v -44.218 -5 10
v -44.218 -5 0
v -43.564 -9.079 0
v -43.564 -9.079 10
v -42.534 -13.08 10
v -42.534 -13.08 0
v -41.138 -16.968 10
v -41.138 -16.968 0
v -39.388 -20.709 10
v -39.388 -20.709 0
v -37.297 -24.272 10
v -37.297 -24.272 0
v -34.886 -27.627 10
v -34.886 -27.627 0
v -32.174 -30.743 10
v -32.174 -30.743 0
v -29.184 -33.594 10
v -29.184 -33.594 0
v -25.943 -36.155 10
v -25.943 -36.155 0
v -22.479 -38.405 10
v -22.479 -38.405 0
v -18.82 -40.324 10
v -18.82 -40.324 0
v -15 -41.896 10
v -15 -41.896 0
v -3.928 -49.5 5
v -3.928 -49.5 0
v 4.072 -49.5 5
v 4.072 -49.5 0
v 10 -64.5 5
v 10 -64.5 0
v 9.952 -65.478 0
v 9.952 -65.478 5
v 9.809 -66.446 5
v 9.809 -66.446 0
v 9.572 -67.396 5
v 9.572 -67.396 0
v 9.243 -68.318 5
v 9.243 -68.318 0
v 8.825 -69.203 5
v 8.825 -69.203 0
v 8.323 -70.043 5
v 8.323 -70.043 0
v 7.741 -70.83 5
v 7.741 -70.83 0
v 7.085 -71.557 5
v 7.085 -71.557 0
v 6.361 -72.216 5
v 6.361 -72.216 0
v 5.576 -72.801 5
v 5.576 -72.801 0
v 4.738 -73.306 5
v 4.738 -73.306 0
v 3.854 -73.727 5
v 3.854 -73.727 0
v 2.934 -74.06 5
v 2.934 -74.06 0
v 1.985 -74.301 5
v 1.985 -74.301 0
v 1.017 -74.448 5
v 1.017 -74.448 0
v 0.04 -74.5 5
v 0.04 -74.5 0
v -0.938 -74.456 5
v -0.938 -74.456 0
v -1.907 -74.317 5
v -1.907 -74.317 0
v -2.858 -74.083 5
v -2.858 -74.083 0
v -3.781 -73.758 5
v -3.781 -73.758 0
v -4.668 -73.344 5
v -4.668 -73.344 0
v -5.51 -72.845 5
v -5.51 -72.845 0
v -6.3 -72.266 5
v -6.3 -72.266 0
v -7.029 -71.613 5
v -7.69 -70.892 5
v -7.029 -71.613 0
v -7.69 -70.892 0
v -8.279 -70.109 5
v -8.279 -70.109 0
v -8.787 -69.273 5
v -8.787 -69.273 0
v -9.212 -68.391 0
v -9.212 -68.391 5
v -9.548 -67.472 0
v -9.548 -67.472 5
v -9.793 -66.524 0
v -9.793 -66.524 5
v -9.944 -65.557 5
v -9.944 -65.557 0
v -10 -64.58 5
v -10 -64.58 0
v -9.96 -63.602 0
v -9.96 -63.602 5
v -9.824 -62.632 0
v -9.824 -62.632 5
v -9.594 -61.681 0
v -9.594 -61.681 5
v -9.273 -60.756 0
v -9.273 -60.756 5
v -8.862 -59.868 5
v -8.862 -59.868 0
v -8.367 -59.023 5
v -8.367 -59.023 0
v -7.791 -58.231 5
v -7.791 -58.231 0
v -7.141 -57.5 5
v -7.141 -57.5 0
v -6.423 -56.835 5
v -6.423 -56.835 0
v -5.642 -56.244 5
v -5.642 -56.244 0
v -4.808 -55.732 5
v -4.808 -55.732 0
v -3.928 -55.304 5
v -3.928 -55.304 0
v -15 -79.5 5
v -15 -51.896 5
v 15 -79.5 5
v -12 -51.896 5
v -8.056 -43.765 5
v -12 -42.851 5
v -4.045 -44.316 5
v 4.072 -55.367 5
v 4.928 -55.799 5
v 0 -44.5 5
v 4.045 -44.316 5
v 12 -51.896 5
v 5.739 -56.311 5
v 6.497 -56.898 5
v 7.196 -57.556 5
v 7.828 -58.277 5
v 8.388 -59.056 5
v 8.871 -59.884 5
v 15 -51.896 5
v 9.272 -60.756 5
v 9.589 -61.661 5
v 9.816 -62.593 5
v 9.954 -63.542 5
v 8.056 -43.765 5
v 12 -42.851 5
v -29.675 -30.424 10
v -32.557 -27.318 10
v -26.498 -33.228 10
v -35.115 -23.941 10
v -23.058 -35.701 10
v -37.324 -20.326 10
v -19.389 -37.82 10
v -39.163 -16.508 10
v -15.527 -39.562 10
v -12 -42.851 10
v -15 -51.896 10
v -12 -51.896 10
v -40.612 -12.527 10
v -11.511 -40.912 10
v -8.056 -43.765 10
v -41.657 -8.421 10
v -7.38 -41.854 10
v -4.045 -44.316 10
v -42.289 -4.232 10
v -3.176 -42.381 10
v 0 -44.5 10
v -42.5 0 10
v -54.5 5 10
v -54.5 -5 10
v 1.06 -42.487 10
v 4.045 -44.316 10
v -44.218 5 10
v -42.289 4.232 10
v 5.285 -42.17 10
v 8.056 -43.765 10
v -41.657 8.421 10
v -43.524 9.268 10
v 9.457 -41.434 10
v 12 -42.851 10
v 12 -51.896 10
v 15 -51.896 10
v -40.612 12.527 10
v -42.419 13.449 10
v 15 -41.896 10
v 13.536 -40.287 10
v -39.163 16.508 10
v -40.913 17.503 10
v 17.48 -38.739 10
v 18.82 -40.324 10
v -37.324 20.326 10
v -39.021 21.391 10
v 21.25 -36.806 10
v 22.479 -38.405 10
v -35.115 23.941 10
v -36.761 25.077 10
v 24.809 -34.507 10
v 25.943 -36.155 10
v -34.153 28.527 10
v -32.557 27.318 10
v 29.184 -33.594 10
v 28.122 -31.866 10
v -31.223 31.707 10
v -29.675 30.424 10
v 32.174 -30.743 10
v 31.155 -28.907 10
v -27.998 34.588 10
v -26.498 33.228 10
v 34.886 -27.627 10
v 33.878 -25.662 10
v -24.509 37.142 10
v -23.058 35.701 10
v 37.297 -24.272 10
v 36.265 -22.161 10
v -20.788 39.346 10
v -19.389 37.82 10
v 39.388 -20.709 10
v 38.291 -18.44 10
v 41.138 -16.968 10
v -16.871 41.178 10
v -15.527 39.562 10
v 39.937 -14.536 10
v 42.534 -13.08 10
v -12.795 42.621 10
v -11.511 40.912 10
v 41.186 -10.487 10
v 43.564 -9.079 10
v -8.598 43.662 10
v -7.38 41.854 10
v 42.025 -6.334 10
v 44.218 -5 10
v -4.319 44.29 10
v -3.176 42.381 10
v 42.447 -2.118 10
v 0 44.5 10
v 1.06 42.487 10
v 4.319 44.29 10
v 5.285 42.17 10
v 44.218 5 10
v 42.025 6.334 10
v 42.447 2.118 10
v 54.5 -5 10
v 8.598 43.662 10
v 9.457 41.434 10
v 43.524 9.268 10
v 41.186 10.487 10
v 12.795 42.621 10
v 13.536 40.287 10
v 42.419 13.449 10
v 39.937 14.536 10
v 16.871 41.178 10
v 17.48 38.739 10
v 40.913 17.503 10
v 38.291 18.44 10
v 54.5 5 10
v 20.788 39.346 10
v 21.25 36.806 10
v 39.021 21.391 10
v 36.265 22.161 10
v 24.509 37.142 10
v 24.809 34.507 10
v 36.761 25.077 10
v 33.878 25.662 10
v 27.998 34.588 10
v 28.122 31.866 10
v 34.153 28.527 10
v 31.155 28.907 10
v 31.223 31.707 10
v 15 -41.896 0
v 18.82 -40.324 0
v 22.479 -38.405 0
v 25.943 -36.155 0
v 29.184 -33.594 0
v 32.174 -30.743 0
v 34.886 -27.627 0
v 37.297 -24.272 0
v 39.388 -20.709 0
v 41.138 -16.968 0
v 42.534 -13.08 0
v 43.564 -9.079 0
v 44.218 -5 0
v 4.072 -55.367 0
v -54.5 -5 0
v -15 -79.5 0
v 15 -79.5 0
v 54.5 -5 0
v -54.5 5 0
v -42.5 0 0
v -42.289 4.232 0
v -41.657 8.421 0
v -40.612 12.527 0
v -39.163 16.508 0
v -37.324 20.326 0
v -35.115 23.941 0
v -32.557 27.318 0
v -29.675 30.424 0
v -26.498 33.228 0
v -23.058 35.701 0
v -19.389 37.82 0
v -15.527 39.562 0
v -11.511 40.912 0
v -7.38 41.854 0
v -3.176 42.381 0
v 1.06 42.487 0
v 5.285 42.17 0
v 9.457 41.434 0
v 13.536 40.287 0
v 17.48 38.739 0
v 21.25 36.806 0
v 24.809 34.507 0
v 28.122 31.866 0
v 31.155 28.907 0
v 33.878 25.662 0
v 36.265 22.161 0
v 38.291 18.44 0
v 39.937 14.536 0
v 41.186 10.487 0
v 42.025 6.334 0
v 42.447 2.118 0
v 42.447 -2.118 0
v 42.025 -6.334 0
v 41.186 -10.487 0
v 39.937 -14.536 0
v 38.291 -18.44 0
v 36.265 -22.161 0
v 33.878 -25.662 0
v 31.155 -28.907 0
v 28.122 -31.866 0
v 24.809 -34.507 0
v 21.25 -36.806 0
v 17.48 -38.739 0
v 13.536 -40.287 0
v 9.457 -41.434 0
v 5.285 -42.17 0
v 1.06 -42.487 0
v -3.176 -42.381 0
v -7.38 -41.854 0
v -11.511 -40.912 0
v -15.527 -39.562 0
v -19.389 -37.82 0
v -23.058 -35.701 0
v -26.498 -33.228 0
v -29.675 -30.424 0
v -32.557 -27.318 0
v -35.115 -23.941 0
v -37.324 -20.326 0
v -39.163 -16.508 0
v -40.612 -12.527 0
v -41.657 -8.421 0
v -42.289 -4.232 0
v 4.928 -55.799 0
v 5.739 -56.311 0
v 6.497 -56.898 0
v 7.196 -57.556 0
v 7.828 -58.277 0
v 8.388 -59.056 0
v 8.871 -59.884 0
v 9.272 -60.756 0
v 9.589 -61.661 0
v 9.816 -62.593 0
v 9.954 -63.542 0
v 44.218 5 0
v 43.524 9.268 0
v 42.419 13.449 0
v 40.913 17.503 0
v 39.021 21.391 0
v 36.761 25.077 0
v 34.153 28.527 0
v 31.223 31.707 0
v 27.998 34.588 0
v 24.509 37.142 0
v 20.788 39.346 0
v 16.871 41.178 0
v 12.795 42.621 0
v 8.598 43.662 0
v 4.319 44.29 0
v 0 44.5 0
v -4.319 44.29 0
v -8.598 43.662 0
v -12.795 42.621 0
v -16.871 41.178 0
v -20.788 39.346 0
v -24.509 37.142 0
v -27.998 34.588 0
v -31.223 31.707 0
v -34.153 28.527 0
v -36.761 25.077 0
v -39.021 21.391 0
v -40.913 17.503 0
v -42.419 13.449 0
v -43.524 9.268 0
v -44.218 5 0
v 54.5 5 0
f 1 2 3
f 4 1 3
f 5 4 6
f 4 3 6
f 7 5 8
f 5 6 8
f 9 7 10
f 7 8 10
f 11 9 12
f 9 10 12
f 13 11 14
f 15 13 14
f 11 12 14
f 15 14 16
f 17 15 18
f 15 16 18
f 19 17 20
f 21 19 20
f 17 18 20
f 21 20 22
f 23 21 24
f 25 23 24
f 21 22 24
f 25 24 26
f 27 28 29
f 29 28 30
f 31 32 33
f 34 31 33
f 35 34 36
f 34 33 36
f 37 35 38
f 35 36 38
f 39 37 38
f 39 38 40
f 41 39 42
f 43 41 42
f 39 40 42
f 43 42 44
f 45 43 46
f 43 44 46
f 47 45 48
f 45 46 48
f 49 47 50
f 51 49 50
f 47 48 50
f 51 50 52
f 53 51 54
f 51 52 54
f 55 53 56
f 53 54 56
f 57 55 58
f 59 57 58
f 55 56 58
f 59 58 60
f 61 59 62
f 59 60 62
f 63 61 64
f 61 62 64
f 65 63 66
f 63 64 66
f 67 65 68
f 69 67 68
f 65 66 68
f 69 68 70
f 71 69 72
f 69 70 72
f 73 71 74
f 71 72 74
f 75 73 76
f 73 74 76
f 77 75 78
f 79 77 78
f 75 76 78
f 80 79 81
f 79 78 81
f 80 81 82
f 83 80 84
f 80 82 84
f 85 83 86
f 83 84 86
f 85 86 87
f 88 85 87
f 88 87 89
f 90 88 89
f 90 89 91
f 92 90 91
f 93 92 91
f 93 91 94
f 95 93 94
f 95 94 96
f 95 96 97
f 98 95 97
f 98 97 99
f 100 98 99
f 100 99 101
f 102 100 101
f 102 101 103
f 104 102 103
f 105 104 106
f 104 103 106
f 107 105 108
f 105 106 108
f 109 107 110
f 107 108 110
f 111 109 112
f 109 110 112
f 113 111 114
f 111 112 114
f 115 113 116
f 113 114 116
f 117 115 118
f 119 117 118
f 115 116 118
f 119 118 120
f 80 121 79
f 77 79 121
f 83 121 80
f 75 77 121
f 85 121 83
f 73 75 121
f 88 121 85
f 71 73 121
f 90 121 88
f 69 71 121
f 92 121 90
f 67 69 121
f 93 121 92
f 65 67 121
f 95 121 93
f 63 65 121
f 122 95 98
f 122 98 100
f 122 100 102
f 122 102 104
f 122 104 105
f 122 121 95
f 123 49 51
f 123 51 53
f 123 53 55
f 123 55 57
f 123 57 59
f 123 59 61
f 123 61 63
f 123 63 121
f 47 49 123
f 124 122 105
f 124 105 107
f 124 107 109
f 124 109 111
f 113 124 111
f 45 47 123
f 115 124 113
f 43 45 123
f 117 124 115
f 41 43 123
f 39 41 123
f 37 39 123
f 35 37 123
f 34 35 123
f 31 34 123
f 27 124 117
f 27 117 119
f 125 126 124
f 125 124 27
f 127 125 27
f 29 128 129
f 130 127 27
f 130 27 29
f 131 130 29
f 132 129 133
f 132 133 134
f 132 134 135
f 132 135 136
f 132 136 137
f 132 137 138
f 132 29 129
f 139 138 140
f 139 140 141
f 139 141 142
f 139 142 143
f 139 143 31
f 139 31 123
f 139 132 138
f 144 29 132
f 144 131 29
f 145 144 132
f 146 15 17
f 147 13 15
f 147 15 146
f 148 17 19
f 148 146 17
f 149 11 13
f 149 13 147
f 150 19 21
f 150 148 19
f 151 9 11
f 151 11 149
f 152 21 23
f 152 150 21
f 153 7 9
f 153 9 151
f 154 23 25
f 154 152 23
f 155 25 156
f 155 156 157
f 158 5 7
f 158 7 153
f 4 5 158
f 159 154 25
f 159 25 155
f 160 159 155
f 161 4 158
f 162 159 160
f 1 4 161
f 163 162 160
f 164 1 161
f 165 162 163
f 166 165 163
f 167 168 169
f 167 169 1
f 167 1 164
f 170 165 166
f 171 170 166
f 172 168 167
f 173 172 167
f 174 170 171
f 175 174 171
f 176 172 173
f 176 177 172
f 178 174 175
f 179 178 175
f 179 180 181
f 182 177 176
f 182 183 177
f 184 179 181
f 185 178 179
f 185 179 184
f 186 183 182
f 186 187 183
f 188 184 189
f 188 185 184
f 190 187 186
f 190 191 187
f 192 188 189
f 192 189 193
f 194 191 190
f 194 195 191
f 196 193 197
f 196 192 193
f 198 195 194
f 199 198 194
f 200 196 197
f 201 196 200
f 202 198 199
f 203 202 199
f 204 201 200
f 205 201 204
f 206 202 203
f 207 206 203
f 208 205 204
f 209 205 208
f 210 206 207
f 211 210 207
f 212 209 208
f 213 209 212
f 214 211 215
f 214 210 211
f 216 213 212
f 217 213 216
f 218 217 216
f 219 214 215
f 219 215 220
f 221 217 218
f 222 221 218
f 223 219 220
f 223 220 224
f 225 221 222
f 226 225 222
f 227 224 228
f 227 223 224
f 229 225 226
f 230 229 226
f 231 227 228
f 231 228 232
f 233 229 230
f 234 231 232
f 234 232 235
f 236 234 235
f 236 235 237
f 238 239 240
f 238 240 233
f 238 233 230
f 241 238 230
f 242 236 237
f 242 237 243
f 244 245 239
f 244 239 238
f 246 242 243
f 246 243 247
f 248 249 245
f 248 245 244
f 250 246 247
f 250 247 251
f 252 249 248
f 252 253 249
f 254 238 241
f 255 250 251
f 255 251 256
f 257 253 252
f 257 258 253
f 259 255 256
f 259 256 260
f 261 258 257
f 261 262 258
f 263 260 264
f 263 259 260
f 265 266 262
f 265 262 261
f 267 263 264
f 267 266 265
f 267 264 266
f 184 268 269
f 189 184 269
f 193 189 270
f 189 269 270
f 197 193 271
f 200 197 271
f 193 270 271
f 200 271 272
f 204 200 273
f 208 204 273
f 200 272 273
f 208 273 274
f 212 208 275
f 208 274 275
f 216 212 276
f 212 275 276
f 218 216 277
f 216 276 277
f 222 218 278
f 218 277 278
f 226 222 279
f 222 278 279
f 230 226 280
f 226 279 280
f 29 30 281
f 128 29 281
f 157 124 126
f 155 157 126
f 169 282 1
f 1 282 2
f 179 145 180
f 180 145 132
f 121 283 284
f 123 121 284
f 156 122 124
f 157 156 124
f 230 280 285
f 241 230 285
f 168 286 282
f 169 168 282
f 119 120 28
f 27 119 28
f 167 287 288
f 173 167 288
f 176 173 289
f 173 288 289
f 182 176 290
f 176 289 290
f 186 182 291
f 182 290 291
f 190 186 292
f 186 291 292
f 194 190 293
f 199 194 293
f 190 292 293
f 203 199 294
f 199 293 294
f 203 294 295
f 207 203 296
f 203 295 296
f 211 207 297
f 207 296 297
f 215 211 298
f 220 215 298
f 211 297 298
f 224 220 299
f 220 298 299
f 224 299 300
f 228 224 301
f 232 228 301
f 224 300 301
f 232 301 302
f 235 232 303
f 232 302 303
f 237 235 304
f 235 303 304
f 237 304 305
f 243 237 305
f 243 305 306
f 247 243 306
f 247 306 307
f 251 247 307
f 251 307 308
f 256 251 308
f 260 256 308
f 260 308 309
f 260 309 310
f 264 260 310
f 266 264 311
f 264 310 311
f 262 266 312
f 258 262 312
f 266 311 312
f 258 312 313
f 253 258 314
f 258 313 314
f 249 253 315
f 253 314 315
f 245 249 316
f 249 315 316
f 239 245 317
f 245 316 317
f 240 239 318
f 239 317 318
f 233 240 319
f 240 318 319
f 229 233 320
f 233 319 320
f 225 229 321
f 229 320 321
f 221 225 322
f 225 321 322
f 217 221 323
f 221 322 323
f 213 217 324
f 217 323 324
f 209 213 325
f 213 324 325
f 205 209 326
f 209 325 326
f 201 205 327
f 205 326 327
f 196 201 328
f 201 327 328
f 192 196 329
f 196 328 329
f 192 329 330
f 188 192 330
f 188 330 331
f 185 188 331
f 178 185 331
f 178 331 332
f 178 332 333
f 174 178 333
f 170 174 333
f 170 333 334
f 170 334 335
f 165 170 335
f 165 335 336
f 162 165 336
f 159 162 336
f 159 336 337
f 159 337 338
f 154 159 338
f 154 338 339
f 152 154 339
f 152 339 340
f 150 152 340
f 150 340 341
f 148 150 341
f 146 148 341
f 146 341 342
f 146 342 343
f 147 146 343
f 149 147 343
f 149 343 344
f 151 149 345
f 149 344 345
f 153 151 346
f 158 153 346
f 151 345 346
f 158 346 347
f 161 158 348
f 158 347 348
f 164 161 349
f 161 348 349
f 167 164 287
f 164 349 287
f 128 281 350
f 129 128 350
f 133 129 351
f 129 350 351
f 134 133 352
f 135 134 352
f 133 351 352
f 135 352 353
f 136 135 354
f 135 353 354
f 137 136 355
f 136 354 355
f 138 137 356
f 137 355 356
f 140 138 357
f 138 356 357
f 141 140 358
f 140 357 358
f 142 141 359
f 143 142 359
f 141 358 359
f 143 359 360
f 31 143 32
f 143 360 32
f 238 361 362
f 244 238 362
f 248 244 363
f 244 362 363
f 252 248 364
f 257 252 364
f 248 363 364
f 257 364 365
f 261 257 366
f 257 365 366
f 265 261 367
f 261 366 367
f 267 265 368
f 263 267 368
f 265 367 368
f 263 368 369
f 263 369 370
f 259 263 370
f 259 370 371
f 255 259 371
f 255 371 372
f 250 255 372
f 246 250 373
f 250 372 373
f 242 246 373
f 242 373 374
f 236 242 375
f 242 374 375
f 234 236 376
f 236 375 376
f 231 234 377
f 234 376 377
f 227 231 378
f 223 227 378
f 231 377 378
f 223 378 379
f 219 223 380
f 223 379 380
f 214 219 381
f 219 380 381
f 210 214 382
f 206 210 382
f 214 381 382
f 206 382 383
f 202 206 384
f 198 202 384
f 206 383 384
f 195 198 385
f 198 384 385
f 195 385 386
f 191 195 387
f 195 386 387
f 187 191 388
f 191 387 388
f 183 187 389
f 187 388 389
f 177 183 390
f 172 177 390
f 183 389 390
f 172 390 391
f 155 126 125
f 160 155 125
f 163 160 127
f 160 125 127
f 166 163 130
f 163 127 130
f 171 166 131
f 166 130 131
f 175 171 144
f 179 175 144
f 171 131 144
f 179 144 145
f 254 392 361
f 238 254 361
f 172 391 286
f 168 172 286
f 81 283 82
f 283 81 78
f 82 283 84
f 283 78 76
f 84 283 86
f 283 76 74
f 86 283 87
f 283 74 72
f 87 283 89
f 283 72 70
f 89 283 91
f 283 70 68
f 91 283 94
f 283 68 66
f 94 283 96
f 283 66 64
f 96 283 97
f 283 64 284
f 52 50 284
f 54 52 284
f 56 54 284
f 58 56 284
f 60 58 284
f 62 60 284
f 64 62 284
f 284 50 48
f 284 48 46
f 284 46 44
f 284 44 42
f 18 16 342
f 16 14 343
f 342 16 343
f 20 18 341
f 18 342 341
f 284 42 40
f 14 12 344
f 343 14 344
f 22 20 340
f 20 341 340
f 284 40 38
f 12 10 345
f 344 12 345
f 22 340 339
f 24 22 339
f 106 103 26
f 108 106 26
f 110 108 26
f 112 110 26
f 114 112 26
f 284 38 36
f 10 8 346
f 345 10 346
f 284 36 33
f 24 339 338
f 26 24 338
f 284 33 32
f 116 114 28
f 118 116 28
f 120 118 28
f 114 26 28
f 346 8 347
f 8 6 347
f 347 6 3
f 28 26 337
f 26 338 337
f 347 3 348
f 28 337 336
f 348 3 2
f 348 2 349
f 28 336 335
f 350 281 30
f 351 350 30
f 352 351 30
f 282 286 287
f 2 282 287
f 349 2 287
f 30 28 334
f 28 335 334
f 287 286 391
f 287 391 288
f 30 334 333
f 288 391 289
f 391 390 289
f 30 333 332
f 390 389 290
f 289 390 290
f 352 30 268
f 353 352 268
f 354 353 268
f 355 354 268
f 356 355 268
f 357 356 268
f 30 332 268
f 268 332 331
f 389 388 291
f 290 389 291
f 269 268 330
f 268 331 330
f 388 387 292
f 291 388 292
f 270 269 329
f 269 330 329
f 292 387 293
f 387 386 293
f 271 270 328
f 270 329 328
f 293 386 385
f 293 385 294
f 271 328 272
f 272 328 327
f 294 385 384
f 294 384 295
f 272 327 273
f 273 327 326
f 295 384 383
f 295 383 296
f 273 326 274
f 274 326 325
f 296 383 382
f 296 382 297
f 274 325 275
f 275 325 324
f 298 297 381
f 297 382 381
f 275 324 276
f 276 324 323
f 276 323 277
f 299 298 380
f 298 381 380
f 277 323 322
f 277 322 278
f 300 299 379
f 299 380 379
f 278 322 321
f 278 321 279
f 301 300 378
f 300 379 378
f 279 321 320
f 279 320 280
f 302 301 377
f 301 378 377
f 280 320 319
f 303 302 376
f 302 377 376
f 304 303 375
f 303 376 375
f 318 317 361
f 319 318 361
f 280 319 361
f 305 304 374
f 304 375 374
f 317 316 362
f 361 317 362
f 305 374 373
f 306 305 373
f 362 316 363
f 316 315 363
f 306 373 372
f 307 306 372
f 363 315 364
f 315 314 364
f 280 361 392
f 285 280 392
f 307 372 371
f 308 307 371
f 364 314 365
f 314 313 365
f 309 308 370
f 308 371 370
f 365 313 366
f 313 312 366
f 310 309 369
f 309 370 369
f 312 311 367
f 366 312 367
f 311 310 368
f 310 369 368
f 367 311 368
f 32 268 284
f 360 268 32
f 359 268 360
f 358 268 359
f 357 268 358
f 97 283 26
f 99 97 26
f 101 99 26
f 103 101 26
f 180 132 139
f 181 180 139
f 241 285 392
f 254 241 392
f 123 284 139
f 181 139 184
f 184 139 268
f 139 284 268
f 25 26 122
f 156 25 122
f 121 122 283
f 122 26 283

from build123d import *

# Parameters (mm, degrees)
F1_DEPTH = 10
F2_DEPTH = 5


with BuildPart() as f1:
    # F0 (on Top) → F1 (new body)
    with BuildSketch(Plane.XY):
        with BuildLine():
            ThreePointArc((-44.218208919, -5), (-44.5, 0), (-44.218208919, 5))
            Line((-44.218208919, 5), (-54.5, 5))
            Line((-54.5, 5), (-54.5, -5))
            Line((-54.5, -5), (-44.218208919, -5))
        make_face()
        with BuildLine():
            Line((54.5, 5), (44.218208919, 5))
            ThreePointArc((44.218208919, 5), (44.4294963785, 2.503967163), (44.5, 0))
            ThreePointArc((44.5, 0), (44.4294963785, -2.503967163), (44.218208919, -5))
            Line((44.218208919, -5), (54.5, -5))
            Line((54.5, -5), (54.5, 5))
        make_face()
        with BuildLine():
            Line((42.5, -5), (42.5, 0))
            ThreePointArc((42.5, 0), (0, -42.5), (-42.5, 0))
            Line((-42.5, 0), (-42.5, -5))
            Line((-42.5, -5), (-44.218208919, -5))
            ThreePointArc((-44.218208919, -5), (-34.885846805, -27.626575841), (-15, -41.895703837))
            Line((-15, -41.895703837), (-12, -41.895703837))
            Line((-12, -41.895703837), (-12, -42.8514877221))
            ThreePointArc((-12, -42.8514877221), (0, -44.5), (12, -42.8514877221))
            Line((12, -42.8514877221), (12, -41.895703837))
            Line((12, -41.895703837), (15, -41.895703837))
            ThreePointArc((15, -41.895703837), (34.885846805, -27.626575841), (44.218208919, -5))
            Line((44.218208919, -5), (42.5, -5))
        make_face()
        with BuildLine():
            Line((42.5, 5), (42.5, 0))
            Line((42.5, 0), (42.5, -5))
            Line((42.5, -5), (44.218208919, -5))
            ThreePointArc((44.218208919, -5), (44.4294963785, -2.503967163), (44.5, 0))
            ThreePointArc((44.5, 0), (44.4294963785, 2.503967163), (44.218208919, 5))
            Line((44.218208919, 5), (42.5, 5))
        make_face()
        with BuildLine():
            ThreePointArc((-42.5, 0), (0, 42.5), (42.5, 0))
            Line((42.5, 0), (42.5, 5))
            Line((42.5, 5), (44.218208919, 5))
            ThreePointArc((44.218208919, 5), (0, 44.5), (-44.218208919, 5))
            Line((-44.218208919, 5), (-42.5, 5))
            Line((-42.5, 5), (-42.5, 0))
        make_face()
        with BuildLine():
            Line((-42.5, -5), (-42.5, 0))
            Line((-42.5, 0), (-42.5, 5))
            Line((-42.5, 5), (-44.218208919, 5))
            ThreePointArc((-44.218208919, 5), (-44.5, 0), (-44.218208919, -5))
            Line((-44.218208919, -5), (-42.5, -5))
        make_face()
        with BuildLine():
            Line((15, -51.895703837), (15, -41.895703837))
            ThreePointArc((15, -41.895703837), (13.5084558965, -42.4001370197), (12, -42.8514877221))
            Line((12, -42.8514877221), (12, -51.895703837))
            Line((12, -51.895703837), (15, -51.895703837))
        make_face()
        with BuildLine():
            ThreePointArc((-12, -42.8514877221), (-13.5084558965, -42.4001370197), (-15, -41.895703837))
            Line((-15, -41.895703837), (-15, -51.895703837))
            Line((-15, -51.895703837), (-12, -51.895703837))
            Line((-12, -51.895703837), (-12, -42.8514877221))
        make_face()
        with BuildLine():
            Line((-12, -41.895703837), (-15, -41.895703837))
            ThreePointArc((-15, -41.895703837), (-13.5084558965, -42.4001370197), (-12, -42.8514877221))
            Line((-12, -42.8514877221), (-12, -41.895703837))
        make_face()
        with BuildLine():
            ThreePointArc((12, -42.8514877221), (13.5084558965, -42.4001370197), (15, -41.895703837))
            Line((15, -41.895703837), (12, -41.895703837))
            Line((12, -41.895703837), (12, -42.8514877221))
        make_face()
    extrude(amount=F1_DEPTH)

    # F0 (on Top) → F2 (join)
    with BuildSketch(Plane.XY):
        with BuildLine():
            Line((12, -51.895703837), (12, -42.8514877221))
            ThreePointArc((12, -42.8514877221), (0, -44.5), (-12, -42.8514877221))
            Line((-12, -42.8514877221), (-12, -51.895703837))
            Line((-12, -51.895703837), (-15, -51.895703837))
            Line((-15, -51.895703837), (-15, -79.5))
            Line((-15, -79.5), (15, -79.5))
            Line((15, -79.5), (15, -51.895703837))
            Line((15, -51.895703837), (12, -51.895703837))
        make_face()
        with BuildLine():
            ThreePointArc((4.0721059777, -55.3666570793), (8.3881183759, -59.0557856295), (10, -64.5))
            ThreePointArc((10, -64.5), (-5.5100390097, -72.8450266693), (-3.9278940223, -55.303715503))
            Line((-3.9278940223, -55.303715503), (-3.9278940223, -49.5))
            Line((-3.9278940223, -49.5), (4.0721059777, -49.5))
            Line((4.0721059777, -49.5), (4.0721059777, -55.3666570793))
        make_face(mode=Mode.SUBTRACT)
    extrude(amount=F2_DEPTH)


solid = f1.part
